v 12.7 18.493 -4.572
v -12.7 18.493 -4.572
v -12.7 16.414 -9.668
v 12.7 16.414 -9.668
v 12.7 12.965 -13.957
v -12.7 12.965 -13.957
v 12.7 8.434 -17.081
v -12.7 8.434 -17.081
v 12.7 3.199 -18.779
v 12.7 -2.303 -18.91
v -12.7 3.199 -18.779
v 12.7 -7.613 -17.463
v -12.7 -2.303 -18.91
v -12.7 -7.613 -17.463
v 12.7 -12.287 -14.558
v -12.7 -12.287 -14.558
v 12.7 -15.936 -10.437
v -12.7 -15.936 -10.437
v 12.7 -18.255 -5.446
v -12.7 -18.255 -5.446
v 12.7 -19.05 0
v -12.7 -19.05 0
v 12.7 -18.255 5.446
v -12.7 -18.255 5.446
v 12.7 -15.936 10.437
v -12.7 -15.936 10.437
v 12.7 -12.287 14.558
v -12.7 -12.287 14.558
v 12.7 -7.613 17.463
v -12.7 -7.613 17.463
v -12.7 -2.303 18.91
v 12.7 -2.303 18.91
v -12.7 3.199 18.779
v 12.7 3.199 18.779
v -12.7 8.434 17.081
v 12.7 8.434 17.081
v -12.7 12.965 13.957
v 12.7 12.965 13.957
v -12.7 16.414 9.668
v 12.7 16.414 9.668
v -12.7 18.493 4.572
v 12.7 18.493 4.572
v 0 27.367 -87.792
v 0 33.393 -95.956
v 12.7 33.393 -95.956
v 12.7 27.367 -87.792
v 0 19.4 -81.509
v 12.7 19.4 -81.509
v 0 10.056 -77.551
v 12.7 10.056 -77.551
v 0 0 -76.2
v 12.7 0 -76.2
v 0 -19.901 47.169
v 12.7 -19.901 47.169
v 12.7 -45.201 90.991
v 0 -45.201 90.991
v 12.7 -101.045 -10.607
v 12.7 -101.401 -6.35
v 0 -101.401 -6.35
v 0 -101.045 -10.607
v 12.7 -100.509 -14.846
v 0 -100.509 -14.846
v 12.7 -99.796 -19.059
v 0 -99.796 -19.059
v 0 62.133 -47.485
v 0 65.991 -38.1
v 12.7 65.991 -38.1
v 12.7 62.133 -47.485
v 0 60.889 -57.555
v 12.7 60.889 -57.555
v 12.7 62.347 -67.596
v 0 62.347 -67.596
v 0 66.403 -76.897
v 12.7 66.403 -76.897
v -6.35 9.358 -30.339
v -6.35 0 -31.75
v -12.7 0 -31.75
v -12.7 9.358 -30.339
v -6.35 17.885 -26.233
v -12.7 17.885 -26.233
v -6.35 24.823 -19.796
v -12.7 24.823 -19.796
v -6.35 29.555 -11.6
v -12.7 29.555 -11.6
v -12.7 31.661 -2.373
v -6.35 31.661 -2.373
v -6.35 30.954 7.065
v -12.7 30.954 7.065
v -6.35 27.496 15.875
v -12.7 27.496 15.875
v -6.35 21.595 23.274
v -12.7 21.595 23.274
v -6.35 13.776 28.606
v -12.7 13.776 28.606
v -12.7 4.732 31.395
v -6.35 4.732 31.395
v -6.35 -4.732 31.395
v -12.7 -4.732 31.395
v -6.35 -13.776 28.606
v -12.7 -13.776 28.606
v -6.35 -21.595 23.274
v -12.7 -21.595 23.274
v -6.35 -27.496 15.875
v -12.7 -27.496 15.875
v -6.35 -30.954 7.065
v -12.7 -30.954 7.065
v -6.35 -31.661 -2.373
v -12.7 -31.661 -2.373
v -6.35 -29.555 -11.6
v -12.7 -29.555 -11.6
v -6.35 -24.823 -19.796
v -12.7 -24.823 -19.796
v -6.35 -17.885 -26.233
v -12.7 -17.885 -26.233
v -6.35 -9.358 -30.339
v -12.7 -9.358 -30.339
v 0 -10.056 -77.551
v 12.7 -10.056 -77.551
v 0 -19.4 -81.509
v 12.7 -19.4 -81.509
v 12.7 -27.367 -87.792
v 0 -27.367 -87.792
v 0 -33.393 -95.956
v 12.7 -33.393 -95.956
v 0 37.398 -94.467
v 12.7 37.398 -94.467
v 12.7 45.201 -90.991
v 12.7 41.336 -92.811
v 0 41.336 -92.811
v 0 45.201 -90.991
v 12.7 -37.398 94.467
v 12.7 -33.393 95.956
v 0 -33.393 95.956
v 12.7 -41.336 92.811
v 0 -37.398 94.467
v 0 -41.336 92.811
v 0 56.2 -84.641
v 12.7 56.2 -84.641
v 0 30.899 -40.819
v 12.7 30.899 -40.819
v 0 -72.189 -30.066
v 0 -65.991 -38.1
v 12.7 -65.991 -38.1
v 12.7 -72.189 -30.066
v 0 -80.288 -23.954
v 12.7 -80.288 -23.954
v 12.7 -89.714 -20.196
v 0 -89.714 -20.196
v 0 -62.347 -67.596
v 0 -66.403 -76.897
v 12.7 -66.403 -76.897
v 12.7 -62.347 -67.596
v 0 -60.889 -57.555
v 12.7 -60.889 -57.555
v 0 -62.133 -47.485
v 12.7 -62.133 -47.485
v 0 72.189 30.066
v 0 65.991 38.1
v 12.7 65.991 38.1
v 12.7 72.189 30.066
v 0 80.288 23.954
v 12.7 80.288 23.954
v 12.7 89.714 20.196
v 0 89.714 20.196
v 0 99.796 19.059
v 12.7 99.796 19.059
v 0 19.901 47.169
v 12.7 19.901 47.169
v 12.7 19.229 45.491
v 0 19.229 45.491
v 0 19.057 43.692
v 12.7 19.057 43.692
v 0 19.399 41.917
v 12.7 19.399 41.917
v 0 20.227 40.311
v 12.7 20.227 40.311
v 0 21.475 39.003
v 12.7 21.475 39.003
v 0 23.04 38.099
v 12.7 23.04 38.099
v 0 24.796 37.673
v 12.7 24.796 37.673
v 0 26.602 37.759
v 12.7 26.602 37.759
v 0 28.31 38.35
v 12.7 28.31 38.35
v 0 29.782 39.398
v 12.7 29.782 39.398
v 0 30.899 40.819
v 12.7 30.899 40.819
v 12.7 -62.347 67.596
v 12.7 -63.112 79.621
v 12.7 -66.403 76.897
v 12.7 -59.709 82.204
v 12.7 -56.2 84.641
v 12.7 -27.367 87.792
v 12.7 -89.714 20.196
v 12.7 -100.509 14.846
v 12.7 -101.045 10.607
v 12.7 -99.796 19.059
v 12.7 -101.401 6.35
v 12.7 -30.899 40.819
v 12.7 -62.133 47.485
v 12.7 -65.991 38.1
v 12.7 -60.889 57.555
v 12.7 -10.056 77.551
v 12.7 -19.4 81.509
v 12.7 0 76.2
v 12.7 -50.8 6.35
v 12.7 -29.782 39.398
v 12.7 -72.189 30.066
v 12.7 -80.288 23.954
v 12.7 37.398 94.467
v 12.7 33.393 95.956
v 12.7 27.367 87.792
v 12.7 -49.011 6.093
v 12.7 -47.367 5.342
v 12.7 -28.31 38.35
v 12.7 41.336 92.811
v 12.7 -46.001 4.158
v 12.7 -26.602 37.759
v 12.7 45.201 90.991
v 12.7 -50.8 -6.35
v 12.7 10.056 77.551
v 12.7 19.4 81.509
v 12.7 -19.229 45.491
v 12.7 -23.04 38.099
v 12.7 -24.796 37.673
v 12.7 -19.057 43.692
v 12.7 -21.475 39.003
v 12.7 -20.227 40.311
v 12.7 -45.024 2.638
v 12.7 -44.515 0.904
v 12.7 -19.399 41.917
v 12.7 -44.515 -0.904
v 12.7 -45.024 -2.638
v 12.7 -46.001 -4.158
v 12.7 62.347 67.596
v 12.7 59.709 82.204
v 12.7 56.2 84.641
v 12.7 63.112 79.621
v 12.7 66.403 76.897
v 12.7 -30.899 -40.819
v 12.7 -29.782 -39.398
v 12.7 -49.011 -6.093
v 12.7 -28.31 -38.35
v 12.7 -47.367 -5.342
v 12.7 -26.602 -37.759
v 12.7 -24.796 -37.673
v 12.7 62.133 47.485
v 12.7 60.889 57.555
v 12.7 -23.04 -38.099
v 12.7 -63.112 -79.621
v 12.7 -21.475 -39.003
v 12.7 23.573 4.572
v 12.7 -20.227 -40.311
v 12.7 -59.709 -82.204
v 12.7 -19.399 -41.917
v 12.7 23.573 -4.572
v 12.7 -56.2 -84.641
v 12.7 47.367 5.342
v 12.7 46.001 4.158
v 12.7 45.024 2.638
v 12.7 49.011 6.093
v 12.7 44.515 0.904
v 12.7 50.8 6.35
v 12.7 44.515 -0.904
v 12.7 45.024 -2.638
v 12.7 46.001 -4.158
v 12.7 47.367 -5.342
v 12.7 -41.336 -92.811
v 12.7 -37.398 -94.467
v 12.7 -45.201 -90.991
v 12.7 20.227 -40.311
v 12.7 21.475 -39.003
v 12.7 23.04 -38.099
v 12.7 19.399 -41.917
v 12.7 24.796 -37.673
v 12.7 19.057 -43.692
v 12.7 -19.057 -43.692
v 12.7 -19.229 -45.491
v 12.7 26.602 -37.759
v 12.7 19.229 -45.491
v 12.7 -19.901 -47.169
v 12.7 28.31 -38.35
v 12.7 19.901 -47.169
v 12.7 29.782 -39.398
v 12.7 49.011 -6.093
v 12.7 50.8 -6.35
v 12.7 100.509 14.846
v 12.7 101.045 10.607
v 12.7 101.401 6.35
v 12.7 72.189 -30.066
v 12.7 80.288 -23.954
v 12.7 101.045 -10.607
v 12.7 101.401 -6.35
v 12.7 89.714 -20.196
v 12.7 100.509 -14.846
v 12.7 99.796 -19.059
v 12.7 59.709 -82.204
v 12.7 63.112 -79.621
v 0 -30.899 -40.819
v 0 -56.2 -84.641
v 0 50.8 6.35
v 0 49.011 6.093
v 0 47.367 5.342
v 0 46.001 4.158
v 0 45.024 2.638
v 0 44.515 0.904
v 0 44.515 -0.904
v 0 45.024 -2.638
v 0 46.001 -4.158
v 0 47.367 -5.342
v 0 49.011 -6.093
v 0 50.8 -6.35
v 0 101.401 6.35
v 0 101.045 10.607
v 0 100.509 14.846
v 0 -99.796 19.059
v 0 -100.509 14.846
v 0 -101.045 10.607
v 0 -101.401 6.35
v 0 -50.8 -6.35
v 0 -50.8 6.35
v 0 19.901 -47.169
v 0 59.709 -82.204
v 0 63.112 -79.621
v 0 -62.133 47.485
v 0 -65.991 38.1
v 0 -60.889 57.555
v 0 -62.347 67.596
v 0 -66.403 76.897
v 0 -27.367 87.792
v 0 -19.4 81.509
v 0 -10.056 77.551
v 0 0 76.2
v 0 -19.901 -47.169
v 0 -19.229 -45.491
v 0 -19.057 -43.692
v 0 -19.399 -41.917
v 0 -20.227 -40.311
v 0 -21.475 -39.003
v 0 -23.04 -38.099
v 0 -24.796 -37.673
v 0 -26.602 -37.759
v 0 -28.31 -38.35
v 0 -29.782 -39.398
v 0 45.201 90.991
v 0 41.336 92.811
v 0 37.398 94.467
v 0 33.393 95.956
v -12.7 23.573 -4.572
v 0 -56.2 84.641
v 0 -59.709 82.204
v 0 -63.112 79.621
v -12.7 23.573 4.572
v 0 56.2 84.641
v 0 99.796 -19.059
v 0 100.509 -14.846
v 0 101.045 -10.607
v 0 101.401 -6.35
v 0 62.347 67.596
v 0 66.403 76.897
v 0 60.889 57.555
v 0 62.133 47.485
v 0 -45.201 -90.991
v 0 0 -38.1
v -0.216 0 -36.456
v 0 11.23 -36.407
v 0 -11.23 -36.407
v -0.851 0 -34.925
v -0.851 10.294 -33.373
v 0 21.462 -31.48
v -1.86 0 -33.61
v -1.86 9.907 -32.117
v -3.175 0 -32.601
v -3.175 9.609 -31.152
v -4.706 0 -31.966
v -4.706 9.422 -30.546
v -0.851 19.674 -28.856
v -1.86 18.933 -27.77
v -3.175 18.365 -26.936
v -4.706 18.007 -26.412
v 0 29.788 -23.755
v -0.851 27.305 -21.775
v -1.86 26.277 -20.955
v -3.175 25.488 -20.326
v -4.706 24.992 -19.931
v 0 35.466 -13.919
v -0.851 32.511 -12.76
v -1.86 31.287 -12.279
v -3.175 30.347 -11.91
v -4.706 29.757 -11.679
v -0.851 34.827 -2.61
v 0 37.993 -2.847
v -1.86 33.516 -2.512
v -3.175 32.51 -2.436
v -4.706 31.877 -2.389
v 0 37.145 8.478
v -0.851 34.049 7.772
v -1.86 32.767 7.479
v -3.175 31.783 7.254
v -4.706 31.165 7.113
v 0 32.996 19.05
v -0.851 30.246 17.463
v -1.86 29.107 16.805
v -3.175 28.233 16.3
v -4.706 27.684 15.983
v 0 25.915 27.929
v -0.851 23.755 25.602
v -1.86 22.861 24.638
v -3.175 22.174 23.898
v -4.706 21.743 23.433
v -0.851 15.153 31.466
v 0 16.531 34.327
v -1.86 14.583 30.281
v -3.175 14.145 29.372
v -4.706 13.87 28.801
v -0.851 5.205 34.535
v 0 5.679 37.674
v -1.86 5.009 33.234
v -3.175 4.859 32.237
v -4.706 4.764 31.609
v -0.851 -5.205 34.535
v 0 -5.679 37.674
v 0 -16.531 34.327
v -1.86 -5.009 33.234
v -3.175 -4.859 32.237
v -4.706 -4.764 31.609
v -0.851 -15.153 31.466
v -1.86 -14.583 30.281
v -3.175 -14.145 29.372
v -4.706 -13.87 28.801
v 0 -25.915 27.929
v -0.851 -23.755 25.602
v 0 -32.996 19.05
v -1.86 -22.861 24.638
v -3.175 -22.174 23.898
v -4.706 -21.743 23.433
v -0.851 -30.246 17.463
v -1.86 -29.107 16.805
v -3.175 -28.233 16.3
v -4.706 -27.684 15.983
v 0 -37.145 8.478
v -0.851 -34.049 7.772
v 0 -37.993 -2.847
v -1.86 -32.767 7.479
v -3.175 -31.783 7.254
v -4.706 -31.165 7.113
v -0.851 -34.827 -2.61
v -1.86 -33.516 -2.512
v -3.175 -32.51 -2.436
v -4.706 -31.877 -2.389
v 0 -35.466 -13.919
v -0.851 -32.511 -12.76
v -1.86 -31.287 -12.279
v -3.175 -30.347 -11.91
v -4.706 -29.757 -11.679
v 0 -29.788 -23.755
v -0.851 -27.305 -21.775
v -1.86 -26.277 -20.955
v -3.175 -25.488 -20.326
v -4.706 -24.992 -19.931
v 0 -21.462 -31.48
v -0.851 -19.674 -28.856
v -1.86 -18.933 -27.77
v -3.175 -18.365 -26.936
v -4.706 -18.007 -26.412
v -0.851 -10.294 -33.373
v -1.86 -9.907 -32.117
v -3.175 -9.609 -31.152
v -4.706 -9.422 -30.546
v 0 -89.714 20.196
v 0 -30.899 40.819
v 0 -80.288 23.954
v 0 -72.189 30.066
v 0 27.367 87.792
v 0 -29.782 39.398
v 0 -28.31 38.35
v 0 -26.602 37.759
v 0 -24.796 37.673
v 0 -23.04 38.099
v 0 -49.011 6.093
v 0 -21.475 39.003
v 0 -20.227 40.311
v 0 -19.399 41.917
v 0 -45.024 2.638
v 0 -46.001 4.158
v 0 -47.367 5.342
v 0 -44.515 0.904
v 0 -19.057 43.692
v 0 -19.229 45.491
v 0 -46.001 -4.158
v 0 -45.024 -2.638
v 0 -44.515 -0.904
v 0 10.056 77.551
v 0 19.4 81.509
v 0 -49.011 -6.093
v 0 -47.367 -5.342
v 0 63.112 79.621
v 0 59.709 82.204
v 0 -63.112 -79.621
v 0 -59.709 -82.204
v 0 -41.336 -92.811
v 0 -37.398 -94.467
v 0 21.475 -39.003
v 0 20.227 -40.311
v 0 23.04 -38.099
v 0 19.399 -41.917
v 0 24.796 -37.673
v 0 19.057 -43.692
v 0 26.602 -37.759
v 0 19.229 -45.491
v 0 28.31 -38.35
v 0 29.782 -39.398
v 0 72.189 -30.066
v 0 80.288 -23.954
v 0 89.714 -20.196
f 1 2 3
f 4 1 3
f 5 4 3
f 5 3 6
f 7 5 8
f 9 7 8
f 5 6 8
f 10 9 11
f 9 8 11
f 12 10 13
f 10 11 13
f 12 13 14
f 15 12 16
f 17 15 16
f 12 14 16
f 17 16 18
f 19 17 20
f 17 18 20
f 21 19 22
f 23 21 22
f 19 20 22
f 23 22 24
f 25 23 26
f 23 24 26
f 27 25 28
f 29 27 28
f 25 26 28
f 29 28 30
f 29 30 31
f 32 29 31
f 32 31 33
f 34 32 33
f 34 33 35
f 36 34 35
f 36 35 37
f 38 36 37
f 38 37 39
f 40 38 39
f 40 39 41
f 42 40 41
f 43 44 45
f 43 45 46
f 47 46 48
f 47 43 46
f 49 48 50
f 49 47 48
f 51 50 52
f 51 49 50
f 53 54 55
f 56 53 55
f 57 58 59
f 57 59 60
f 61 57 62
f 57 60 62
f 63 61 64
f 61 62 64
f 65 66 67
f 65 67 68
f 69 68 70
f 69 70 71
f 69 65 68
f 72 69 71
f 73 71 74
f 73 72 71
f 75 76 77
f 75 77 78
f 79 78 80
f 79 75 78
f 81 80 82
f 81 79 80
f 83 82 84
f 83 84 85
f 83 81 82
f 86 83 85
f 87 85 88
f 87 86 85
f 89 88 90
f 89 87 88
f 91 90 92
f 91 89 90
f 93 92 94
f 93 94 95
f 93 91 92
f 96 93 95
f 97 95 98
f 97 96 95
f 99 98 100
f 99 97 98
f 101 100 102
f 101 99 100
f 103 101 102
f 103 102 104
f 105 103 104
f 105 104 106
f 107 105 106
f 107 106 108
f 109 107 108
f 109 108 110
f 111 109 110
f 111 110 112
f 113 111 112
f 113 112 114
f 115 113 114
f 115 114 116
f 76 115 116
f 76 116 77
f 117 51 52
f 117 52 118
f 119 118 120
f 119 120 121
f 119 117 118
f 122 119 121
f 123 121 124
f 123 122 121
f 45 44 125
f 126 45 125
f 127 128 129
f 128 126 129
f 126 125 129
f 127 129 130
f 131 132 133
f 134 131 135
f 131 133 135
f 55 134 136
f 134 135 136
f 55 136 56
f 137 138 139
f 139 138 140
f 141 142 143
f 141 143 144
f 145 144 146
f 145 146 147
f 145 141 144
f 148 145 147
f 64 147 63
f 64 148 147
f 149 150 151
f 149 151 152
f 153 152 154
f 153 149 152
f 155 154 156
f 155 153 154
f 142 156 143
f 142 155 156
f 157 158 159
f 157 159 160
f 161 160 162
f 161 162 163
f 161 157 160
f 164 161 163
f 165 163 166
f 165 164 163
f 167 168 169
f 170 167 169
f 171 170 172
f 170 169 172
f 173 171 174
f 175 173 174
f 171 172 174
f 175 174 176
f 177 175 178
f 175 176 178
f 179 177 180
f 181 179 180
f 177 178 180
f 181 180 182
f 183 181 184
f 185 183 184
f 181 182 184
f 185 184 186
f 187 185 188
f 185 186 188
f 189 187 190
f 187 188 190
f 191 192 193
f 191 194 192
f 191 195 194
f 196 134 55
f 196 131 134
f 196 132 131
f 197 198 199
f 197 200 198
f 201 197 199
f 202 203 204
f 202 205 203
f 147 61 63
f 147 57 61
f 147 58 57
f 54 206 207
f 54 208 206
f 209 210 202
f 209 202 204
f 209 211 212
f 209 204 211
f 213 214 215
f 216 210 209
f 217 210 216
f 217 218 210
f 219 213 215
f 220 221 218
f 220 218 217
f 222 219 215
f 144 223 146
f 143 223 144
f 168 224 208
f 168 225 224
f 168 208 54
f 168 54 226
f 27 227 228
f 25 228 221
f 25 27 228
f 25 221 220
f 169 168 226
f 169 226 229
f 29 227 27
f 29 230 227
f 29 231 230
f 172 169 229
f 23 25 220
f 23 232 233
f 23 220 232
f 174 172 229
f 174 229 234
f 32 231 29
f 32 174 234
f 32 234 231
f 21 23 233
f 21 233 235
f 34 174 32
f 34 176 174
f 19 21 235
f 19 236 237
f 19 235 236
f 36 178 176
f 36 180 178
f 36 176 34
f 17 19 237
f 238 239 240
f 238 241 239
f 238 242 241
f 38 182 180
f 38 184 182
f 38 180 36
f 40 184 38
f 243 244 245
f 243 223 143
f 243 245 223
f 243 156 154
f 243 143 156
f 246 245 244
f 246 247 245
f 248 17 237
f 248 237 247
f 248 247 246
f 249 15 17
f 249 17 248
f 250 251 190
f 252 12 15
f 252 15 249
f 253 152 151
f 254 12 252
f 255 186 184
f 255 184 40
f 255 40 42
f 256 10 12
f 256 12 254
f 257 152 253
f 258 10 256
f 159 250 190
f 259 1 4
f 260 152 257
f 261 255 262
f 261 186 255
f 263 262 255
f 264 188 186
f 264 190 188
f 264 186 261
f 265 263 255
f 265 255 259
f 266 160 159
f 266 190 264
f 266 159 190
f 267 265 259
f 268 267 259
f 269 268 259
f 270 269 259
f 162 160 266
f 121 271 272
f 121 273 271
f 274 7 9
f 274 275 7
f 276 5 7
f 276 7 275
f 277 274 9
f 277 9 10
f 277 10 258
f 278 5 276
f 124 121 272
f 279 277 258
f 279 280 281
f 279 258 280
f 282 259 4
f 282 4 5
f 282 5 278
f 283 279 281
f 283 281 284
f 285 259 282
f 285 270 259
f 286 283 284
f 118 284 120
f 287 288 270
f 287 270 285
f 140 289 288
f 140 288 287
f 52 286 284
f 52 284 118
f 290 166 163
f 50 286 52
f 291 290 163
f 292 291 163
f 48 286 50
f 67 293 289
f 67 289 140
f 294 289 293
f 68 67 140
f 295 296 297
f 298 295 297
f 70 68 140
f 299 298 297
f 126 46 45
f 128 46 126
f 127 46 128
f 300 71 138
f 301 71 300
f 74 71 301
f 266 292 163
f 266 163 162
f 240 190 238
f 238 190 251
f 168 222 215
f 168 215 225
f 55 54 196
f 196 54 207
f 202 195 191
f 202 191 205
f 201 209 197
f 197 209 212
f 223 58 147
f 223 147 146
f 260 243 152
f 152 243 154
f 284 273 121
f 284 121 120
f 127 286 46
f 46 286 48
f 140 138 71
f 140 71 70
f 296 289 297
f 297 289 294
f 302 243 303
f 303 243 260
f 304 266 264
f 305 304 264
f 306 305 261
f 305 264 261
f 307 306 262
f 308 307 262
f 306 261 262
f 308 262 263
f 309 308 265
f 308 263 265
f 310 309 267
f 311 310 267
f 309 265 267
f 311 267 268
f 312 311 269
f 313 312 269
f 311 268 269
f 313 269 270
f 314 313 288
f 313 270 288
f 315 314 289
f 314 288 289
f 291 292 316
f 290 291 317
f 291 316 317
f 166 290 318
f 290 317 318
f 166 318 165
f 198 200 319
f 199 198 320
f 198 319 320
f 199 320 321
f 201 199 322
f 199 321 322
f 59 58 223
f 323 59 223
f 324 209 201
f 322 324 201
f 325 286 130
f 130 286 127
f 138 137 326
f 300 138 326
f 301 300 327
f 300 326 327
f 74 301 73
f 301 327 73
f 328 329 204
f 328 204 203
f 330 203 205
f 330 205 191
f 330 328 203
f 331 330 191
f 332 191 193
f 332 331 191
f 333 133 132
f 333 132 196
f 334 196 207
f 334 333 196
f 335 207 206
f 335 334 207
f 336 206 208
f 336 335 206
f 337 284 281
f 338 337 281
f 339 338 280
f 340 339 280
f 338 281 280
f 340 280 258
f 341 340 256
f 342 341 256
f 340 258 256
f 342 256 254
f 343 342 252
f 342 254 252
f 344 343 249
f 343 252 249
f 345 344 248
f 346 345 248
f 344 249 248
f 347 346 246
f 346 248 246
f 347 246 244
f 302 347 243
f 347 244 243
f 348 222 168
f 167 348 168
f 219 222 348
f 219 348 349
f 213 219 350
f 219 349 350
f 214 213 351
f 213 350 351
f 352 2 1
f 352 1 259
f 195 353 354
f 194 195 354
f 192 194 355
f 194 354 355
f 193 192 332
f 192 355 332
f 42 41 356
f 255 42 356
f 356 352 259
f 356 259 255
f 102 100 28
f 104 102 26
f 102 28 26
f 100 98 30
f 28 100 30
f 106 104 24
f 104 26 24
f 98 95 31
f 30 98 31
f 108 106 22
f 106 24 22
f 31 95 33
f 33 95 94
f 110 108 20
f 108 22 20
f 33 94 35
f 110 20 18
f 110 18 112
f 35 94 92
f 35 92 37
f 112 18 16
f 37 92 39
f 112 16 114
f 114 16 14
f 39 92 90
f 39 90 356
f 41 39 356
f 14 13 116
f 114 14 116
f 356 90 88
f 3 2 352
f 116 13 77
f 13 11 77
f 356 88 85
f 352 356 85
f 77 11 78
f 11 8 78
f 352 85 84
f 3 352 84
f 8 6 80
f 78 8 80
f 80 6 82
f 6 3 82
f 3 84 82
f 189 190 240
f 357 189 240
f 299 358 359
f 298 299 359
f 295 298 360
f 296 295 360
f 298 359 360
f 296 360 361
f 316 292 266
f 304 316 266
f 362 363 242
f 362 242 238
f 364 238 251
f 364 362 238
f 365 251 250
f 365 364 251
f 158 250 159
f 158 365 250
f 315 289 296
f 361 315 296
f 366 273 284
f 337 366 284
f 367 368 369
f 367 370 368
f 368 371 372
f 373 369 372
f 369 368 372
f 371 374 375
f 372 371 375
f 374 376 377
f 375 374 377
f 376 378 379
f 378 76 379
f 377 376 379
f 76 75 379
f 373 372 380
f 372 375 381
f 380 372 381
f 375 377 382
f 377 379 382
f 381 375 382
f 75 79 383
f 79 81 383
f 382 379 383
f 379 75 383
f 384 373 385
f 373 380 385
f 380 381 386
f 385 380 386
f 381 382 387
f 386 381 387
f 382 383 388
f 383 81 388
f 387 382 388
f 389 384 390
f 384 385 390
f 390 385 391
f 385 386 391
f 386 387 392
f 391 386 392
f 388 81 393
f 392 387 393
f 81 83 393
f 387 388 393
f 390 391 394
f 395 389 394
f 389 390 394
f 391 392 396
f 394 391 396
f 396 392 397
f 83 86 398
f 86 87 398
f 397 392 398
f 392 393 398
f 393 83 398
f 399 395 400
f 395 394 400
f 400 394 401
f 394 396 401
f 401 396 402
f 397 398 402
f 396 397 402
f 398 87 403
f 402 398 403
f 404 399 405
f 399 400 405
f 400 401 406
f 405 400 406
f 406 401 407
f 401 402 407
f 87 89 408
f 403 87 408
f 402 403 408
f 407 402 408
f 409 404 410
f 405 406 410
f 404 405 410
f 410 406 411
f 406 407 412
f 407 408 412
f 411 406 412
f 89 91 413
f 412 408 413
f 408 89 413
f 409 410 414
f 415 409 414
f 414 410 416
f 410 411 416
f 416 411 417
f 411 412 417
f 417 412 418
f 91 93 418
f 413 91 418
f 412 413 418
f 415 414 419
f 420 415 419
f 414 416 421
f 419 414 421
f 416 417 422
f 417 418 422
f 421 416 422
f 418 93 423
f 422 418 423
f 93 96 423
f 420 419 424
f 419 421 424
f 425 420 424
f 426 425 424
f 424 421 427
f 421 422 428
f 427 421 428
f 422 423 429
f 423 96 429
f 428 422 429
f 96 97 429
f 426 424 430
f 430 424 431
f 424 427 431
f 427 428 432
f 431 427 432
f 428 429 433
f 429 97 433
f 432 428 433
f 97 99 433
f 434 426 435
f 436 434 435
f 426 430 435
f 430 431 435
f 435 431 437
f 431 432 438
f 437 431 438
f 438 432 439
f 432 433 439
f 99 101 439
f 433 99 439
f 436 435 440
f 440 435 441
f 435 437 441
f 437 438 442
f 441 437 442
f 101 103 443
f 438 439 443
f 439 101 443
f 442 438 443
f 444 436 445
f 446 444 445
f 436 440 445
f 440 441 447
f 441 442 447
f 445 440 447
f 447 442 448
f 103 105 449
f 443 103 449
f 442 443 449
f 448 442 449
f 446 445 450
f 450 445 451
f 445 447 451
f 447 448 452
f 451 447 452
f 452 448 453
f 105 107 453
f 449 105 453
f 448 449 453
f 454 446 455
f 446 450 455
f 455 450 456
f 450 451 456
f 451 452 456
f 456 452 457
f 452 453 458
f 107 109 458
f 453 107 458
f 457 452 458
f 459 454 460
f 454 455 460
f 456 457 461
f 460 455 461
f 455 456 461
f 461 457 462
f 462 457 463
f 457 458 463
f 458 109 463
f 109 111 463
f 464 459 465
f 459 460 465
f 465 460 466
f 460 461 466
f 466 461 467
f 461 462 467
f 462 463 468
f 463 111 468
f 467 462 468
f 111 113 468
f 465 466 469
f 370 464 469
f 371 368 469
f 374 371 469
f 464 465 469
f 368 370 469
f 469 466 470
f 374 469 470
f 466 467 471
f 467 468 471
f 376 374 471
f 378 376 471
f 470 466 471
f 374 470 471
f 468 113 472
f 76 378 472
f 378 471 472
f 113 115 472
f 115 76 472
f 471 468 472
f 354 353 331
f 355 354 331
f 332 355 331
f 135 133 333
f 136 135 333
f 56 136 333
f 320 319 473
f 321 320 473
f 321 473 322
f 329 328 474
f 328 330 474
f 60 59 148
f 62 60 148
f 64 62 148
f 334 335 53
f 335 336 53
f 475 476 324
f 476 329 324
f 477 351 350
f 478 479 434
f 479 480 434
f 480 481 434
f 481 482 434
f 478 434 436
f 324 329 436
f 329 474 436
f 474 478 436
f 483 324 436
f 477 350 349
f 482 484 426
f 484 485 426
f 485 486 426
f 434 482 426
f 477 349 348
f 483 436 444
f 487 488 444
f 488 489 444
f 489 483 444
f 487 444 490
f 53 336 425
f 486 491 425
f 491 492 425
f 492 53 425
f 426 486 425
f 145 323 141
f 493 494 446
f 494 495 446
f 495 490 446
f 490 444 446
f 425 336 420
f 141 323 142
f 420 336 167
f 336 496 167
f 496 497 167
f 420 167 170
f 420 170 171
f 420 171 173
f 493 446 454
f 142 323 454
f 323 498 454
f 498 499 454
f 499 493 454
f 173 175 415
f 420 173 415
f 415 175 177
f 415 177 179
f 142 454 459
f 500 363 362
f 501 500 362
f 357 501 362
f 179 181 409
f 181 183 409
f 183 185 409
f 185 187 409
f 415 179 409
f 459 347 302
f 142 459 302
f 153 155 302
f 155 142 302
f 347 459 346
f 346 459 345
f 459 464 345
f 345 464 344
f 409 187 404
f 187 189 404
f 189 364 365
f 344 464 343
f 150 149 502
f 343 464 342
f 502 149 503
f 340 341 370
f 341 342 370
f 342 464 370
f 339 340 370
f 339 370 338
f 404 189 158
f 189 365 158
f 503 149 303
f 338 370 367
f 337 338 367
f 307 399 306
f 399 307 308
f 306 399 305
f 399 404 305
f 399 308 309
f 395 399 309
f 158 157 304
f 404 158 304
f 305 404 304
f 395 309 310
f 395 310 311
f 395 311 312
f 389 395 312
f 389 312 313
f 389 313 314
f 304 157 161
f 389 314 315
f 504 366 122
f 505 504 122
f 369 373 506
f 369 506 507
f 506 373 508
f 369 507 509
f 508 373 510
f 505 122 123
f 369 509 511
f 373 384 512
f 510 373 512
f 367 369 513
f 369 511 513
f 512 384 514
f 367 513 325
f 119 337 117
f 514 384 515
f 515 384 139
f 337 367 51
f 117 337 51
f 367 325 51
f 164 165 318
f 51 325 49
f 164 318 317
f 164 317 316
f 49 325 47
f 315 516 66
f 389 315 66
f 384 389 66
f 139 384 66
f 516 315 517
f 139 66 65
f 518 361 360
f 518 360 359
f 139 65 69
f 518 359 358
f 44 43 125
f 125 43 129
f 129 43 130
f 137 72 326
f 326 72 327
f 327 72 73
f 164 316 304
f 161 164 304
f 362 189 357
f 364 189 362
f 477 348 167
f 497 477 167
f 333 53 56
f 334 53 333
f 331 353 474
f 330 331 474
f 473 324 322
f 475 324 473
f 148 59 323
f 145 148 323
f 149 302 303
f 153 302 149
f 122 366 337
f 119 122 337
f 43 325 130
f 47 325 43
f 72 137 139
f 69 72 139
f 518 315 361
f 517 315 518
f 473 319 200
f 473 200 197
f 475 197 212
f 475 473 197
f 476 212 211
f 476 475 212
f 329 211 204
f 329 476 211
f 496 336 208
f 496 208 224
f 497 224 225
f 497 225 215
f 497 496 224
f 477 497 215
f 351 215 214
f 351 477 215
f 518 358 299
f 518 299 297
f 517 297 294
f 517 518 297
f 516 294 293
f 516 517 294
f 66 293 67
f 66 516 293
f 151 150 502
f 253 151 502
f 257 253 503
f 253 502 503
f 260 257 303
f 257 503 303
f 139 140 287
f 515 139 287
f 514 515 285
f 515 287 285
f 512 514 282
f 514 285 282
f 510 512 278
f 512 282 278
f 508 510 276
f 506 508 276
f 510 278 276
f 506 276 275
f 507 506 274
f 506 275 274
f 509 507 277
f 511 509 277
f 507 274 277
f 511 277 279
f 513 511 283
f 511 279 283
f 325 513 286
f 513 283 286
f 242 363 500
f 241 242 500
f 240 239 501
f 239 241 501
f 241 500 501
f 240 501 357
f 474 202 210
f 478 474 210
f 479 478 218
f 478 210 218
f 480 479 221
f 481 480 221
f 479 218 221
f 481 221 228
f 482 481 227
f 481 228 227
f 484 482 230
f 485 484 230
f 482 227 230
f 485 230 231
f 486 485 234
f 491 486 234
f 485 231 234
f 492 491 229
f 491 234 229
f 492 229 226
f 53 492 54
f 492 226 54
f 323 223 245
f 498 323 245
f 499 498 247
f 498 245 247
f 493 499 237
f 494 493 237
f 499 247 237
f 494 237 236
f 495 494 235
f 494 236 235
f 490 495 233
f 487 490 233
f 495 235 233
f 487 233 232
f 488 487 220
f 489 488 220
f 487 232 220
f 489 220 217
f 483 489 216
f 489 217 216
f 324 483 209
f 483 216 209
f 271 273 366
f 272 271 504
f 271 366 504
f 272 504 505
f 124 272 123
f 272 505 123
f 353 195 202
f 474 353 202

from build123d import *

# Parameters (mm, degrees)
SKETCH1_R           = 101.6
BOSS_EXTRUDE1_DEPTH = 12.7
CUT_EXTRUDE1_DEPTH  = 145.244271983
CIRPATTERN1_COUNT   = 6
CUT_EXTRUDE2_START  = -12.7
CUT_EXTRUDE2_DEPTH  = 12.7
CIRPATTERN2_COUNT   = 6
SKETCH4_R           = 31.75
BOSS_EXTRUDE2_DEPTH = 25.4
SKETCH7_R           = 19.05
SKETCH7_W           = 9.144
SKETCH7_H           = 5.08
CUT_EXTRUDE5_DEPTH  = 142.897378912
FILLET1_R           = 6.35


with BuildPart() as part:
    # Sketch1 → Boss-Extrude1 (new body)
    with BuildSketch(Plane(origin=(0, 0, 0), x_dir=(0, 0, -1), z_dir=(1, 0, 0))):
        Circle(SKETCH1_R)
    extrude(amount=BOSS_EXTRUDE1_DEPTH)

    # Sketch2 → Cut-Extrude1 (cut, symmetric)
    with BuildSketch(Plane(origin=(12.7, 0, 0), x_dir=(0, 0, -1), z_dir=(1, 0, 0))):
        with BuildLine():
            Line((6.35, 50.8), (6.35, 101.401368334))
            ThreePointArc((6.35, 101.401368334), (0, 101.6), (-6.35, 101.401368334))
            Line((-6.35, 101.401368334), (-6.35, 50.8))
            ThreePointArc((-6.35, 50.8), (0, 44.45), (6.35, 50.8))
        make_face()
    cut_extrude1 = extrude(amount=CUT_EXTRUDE1_DEPTH, both=True, mode=Mode.SUBTRACT)

    # CirPattern1: Cut-Extrude1 ×6 about axis
    cirpattern1_axis = Axis((12.7, 0, 0), (-1, 0, 0))
    for i in range(1, CIRPATTERN1_COUNT):
        add(cut_extrude1.rotate(cirpattern1_axis, i * 360 / CIRPATTERN1_COUNT), mode=Mode.SUBTRACT)

    # Sketch3 → Cut-Extrude2 (cut)
    with BuildSketch(Plane(origin=(12.7, 0, 0), x_dir=(0, 0, -1), z_dir=(1, 0, 0)).offset(CUT_EXTRUDE2_START)):
        with BuildLine():
            ThreePointArc((-76.2, 0), (-81.508741002, 19.399570442), (-95.955555556, 33.392983665))
            ThreePointArc((-95.955555556, 33.392983665), (-101.6, 0), (-95.955555556, -33.392983665))
            ThreePointArc((-95.955555556, -33.392983665), (-81.508741002, -19.399570442), (-76.2, 0))
        make_face()
    cut_extrude2 = extrude(amount=CUT_EXTRUDE2_DEPTH, mode=Mode.SUBTRACT)

    # CirPattern2: Cut-Extrude2 ×6 about axis
    cirpattern2_axis = Axis((0, 0, 0), (1, 0, 0))
    for i in range(1, CIRPATTERN2_COUNT):
        add(cut_extrude2.rotate(cirpattern2_axis, i * 360 / CIRPATTERN2_COUNT), mode=Mode.SUBTRACT)

    # Sketch4 → Boss-Extrude2 (add)
    with BuildSketch(Plane(origin=(12.7, 0, 0), x_dir=(0, 0, -1), z_dir=(1, 0, 0))):
        Circle(SKETCH4_R)
    extrude(amount=-BOSS_EXTRUDE2_DEPTH)

    # Sketch7 → Cut-Extrude5 (cut, through all)
    with BuildSketch(Plane.ZY.offset(12.7)):
        Circle(SKETCH7_R)
        with Locations((0, 21.033223516)):
            Rectangle(SKETCH7_W, SKETCH7_H)
    extrude(amount=-CUT_EXTRUDE5_DEPTH, mode=Mode.SUBTRACT)

    # Fillet1
    fillet1_edges = [part.edges().sort_by_distance(p)[0] for p in [
        (0, 0, 31.75),
    ]]
    fillet(fillet1_edges, radius=FILLET1_R)


solid = part.part
